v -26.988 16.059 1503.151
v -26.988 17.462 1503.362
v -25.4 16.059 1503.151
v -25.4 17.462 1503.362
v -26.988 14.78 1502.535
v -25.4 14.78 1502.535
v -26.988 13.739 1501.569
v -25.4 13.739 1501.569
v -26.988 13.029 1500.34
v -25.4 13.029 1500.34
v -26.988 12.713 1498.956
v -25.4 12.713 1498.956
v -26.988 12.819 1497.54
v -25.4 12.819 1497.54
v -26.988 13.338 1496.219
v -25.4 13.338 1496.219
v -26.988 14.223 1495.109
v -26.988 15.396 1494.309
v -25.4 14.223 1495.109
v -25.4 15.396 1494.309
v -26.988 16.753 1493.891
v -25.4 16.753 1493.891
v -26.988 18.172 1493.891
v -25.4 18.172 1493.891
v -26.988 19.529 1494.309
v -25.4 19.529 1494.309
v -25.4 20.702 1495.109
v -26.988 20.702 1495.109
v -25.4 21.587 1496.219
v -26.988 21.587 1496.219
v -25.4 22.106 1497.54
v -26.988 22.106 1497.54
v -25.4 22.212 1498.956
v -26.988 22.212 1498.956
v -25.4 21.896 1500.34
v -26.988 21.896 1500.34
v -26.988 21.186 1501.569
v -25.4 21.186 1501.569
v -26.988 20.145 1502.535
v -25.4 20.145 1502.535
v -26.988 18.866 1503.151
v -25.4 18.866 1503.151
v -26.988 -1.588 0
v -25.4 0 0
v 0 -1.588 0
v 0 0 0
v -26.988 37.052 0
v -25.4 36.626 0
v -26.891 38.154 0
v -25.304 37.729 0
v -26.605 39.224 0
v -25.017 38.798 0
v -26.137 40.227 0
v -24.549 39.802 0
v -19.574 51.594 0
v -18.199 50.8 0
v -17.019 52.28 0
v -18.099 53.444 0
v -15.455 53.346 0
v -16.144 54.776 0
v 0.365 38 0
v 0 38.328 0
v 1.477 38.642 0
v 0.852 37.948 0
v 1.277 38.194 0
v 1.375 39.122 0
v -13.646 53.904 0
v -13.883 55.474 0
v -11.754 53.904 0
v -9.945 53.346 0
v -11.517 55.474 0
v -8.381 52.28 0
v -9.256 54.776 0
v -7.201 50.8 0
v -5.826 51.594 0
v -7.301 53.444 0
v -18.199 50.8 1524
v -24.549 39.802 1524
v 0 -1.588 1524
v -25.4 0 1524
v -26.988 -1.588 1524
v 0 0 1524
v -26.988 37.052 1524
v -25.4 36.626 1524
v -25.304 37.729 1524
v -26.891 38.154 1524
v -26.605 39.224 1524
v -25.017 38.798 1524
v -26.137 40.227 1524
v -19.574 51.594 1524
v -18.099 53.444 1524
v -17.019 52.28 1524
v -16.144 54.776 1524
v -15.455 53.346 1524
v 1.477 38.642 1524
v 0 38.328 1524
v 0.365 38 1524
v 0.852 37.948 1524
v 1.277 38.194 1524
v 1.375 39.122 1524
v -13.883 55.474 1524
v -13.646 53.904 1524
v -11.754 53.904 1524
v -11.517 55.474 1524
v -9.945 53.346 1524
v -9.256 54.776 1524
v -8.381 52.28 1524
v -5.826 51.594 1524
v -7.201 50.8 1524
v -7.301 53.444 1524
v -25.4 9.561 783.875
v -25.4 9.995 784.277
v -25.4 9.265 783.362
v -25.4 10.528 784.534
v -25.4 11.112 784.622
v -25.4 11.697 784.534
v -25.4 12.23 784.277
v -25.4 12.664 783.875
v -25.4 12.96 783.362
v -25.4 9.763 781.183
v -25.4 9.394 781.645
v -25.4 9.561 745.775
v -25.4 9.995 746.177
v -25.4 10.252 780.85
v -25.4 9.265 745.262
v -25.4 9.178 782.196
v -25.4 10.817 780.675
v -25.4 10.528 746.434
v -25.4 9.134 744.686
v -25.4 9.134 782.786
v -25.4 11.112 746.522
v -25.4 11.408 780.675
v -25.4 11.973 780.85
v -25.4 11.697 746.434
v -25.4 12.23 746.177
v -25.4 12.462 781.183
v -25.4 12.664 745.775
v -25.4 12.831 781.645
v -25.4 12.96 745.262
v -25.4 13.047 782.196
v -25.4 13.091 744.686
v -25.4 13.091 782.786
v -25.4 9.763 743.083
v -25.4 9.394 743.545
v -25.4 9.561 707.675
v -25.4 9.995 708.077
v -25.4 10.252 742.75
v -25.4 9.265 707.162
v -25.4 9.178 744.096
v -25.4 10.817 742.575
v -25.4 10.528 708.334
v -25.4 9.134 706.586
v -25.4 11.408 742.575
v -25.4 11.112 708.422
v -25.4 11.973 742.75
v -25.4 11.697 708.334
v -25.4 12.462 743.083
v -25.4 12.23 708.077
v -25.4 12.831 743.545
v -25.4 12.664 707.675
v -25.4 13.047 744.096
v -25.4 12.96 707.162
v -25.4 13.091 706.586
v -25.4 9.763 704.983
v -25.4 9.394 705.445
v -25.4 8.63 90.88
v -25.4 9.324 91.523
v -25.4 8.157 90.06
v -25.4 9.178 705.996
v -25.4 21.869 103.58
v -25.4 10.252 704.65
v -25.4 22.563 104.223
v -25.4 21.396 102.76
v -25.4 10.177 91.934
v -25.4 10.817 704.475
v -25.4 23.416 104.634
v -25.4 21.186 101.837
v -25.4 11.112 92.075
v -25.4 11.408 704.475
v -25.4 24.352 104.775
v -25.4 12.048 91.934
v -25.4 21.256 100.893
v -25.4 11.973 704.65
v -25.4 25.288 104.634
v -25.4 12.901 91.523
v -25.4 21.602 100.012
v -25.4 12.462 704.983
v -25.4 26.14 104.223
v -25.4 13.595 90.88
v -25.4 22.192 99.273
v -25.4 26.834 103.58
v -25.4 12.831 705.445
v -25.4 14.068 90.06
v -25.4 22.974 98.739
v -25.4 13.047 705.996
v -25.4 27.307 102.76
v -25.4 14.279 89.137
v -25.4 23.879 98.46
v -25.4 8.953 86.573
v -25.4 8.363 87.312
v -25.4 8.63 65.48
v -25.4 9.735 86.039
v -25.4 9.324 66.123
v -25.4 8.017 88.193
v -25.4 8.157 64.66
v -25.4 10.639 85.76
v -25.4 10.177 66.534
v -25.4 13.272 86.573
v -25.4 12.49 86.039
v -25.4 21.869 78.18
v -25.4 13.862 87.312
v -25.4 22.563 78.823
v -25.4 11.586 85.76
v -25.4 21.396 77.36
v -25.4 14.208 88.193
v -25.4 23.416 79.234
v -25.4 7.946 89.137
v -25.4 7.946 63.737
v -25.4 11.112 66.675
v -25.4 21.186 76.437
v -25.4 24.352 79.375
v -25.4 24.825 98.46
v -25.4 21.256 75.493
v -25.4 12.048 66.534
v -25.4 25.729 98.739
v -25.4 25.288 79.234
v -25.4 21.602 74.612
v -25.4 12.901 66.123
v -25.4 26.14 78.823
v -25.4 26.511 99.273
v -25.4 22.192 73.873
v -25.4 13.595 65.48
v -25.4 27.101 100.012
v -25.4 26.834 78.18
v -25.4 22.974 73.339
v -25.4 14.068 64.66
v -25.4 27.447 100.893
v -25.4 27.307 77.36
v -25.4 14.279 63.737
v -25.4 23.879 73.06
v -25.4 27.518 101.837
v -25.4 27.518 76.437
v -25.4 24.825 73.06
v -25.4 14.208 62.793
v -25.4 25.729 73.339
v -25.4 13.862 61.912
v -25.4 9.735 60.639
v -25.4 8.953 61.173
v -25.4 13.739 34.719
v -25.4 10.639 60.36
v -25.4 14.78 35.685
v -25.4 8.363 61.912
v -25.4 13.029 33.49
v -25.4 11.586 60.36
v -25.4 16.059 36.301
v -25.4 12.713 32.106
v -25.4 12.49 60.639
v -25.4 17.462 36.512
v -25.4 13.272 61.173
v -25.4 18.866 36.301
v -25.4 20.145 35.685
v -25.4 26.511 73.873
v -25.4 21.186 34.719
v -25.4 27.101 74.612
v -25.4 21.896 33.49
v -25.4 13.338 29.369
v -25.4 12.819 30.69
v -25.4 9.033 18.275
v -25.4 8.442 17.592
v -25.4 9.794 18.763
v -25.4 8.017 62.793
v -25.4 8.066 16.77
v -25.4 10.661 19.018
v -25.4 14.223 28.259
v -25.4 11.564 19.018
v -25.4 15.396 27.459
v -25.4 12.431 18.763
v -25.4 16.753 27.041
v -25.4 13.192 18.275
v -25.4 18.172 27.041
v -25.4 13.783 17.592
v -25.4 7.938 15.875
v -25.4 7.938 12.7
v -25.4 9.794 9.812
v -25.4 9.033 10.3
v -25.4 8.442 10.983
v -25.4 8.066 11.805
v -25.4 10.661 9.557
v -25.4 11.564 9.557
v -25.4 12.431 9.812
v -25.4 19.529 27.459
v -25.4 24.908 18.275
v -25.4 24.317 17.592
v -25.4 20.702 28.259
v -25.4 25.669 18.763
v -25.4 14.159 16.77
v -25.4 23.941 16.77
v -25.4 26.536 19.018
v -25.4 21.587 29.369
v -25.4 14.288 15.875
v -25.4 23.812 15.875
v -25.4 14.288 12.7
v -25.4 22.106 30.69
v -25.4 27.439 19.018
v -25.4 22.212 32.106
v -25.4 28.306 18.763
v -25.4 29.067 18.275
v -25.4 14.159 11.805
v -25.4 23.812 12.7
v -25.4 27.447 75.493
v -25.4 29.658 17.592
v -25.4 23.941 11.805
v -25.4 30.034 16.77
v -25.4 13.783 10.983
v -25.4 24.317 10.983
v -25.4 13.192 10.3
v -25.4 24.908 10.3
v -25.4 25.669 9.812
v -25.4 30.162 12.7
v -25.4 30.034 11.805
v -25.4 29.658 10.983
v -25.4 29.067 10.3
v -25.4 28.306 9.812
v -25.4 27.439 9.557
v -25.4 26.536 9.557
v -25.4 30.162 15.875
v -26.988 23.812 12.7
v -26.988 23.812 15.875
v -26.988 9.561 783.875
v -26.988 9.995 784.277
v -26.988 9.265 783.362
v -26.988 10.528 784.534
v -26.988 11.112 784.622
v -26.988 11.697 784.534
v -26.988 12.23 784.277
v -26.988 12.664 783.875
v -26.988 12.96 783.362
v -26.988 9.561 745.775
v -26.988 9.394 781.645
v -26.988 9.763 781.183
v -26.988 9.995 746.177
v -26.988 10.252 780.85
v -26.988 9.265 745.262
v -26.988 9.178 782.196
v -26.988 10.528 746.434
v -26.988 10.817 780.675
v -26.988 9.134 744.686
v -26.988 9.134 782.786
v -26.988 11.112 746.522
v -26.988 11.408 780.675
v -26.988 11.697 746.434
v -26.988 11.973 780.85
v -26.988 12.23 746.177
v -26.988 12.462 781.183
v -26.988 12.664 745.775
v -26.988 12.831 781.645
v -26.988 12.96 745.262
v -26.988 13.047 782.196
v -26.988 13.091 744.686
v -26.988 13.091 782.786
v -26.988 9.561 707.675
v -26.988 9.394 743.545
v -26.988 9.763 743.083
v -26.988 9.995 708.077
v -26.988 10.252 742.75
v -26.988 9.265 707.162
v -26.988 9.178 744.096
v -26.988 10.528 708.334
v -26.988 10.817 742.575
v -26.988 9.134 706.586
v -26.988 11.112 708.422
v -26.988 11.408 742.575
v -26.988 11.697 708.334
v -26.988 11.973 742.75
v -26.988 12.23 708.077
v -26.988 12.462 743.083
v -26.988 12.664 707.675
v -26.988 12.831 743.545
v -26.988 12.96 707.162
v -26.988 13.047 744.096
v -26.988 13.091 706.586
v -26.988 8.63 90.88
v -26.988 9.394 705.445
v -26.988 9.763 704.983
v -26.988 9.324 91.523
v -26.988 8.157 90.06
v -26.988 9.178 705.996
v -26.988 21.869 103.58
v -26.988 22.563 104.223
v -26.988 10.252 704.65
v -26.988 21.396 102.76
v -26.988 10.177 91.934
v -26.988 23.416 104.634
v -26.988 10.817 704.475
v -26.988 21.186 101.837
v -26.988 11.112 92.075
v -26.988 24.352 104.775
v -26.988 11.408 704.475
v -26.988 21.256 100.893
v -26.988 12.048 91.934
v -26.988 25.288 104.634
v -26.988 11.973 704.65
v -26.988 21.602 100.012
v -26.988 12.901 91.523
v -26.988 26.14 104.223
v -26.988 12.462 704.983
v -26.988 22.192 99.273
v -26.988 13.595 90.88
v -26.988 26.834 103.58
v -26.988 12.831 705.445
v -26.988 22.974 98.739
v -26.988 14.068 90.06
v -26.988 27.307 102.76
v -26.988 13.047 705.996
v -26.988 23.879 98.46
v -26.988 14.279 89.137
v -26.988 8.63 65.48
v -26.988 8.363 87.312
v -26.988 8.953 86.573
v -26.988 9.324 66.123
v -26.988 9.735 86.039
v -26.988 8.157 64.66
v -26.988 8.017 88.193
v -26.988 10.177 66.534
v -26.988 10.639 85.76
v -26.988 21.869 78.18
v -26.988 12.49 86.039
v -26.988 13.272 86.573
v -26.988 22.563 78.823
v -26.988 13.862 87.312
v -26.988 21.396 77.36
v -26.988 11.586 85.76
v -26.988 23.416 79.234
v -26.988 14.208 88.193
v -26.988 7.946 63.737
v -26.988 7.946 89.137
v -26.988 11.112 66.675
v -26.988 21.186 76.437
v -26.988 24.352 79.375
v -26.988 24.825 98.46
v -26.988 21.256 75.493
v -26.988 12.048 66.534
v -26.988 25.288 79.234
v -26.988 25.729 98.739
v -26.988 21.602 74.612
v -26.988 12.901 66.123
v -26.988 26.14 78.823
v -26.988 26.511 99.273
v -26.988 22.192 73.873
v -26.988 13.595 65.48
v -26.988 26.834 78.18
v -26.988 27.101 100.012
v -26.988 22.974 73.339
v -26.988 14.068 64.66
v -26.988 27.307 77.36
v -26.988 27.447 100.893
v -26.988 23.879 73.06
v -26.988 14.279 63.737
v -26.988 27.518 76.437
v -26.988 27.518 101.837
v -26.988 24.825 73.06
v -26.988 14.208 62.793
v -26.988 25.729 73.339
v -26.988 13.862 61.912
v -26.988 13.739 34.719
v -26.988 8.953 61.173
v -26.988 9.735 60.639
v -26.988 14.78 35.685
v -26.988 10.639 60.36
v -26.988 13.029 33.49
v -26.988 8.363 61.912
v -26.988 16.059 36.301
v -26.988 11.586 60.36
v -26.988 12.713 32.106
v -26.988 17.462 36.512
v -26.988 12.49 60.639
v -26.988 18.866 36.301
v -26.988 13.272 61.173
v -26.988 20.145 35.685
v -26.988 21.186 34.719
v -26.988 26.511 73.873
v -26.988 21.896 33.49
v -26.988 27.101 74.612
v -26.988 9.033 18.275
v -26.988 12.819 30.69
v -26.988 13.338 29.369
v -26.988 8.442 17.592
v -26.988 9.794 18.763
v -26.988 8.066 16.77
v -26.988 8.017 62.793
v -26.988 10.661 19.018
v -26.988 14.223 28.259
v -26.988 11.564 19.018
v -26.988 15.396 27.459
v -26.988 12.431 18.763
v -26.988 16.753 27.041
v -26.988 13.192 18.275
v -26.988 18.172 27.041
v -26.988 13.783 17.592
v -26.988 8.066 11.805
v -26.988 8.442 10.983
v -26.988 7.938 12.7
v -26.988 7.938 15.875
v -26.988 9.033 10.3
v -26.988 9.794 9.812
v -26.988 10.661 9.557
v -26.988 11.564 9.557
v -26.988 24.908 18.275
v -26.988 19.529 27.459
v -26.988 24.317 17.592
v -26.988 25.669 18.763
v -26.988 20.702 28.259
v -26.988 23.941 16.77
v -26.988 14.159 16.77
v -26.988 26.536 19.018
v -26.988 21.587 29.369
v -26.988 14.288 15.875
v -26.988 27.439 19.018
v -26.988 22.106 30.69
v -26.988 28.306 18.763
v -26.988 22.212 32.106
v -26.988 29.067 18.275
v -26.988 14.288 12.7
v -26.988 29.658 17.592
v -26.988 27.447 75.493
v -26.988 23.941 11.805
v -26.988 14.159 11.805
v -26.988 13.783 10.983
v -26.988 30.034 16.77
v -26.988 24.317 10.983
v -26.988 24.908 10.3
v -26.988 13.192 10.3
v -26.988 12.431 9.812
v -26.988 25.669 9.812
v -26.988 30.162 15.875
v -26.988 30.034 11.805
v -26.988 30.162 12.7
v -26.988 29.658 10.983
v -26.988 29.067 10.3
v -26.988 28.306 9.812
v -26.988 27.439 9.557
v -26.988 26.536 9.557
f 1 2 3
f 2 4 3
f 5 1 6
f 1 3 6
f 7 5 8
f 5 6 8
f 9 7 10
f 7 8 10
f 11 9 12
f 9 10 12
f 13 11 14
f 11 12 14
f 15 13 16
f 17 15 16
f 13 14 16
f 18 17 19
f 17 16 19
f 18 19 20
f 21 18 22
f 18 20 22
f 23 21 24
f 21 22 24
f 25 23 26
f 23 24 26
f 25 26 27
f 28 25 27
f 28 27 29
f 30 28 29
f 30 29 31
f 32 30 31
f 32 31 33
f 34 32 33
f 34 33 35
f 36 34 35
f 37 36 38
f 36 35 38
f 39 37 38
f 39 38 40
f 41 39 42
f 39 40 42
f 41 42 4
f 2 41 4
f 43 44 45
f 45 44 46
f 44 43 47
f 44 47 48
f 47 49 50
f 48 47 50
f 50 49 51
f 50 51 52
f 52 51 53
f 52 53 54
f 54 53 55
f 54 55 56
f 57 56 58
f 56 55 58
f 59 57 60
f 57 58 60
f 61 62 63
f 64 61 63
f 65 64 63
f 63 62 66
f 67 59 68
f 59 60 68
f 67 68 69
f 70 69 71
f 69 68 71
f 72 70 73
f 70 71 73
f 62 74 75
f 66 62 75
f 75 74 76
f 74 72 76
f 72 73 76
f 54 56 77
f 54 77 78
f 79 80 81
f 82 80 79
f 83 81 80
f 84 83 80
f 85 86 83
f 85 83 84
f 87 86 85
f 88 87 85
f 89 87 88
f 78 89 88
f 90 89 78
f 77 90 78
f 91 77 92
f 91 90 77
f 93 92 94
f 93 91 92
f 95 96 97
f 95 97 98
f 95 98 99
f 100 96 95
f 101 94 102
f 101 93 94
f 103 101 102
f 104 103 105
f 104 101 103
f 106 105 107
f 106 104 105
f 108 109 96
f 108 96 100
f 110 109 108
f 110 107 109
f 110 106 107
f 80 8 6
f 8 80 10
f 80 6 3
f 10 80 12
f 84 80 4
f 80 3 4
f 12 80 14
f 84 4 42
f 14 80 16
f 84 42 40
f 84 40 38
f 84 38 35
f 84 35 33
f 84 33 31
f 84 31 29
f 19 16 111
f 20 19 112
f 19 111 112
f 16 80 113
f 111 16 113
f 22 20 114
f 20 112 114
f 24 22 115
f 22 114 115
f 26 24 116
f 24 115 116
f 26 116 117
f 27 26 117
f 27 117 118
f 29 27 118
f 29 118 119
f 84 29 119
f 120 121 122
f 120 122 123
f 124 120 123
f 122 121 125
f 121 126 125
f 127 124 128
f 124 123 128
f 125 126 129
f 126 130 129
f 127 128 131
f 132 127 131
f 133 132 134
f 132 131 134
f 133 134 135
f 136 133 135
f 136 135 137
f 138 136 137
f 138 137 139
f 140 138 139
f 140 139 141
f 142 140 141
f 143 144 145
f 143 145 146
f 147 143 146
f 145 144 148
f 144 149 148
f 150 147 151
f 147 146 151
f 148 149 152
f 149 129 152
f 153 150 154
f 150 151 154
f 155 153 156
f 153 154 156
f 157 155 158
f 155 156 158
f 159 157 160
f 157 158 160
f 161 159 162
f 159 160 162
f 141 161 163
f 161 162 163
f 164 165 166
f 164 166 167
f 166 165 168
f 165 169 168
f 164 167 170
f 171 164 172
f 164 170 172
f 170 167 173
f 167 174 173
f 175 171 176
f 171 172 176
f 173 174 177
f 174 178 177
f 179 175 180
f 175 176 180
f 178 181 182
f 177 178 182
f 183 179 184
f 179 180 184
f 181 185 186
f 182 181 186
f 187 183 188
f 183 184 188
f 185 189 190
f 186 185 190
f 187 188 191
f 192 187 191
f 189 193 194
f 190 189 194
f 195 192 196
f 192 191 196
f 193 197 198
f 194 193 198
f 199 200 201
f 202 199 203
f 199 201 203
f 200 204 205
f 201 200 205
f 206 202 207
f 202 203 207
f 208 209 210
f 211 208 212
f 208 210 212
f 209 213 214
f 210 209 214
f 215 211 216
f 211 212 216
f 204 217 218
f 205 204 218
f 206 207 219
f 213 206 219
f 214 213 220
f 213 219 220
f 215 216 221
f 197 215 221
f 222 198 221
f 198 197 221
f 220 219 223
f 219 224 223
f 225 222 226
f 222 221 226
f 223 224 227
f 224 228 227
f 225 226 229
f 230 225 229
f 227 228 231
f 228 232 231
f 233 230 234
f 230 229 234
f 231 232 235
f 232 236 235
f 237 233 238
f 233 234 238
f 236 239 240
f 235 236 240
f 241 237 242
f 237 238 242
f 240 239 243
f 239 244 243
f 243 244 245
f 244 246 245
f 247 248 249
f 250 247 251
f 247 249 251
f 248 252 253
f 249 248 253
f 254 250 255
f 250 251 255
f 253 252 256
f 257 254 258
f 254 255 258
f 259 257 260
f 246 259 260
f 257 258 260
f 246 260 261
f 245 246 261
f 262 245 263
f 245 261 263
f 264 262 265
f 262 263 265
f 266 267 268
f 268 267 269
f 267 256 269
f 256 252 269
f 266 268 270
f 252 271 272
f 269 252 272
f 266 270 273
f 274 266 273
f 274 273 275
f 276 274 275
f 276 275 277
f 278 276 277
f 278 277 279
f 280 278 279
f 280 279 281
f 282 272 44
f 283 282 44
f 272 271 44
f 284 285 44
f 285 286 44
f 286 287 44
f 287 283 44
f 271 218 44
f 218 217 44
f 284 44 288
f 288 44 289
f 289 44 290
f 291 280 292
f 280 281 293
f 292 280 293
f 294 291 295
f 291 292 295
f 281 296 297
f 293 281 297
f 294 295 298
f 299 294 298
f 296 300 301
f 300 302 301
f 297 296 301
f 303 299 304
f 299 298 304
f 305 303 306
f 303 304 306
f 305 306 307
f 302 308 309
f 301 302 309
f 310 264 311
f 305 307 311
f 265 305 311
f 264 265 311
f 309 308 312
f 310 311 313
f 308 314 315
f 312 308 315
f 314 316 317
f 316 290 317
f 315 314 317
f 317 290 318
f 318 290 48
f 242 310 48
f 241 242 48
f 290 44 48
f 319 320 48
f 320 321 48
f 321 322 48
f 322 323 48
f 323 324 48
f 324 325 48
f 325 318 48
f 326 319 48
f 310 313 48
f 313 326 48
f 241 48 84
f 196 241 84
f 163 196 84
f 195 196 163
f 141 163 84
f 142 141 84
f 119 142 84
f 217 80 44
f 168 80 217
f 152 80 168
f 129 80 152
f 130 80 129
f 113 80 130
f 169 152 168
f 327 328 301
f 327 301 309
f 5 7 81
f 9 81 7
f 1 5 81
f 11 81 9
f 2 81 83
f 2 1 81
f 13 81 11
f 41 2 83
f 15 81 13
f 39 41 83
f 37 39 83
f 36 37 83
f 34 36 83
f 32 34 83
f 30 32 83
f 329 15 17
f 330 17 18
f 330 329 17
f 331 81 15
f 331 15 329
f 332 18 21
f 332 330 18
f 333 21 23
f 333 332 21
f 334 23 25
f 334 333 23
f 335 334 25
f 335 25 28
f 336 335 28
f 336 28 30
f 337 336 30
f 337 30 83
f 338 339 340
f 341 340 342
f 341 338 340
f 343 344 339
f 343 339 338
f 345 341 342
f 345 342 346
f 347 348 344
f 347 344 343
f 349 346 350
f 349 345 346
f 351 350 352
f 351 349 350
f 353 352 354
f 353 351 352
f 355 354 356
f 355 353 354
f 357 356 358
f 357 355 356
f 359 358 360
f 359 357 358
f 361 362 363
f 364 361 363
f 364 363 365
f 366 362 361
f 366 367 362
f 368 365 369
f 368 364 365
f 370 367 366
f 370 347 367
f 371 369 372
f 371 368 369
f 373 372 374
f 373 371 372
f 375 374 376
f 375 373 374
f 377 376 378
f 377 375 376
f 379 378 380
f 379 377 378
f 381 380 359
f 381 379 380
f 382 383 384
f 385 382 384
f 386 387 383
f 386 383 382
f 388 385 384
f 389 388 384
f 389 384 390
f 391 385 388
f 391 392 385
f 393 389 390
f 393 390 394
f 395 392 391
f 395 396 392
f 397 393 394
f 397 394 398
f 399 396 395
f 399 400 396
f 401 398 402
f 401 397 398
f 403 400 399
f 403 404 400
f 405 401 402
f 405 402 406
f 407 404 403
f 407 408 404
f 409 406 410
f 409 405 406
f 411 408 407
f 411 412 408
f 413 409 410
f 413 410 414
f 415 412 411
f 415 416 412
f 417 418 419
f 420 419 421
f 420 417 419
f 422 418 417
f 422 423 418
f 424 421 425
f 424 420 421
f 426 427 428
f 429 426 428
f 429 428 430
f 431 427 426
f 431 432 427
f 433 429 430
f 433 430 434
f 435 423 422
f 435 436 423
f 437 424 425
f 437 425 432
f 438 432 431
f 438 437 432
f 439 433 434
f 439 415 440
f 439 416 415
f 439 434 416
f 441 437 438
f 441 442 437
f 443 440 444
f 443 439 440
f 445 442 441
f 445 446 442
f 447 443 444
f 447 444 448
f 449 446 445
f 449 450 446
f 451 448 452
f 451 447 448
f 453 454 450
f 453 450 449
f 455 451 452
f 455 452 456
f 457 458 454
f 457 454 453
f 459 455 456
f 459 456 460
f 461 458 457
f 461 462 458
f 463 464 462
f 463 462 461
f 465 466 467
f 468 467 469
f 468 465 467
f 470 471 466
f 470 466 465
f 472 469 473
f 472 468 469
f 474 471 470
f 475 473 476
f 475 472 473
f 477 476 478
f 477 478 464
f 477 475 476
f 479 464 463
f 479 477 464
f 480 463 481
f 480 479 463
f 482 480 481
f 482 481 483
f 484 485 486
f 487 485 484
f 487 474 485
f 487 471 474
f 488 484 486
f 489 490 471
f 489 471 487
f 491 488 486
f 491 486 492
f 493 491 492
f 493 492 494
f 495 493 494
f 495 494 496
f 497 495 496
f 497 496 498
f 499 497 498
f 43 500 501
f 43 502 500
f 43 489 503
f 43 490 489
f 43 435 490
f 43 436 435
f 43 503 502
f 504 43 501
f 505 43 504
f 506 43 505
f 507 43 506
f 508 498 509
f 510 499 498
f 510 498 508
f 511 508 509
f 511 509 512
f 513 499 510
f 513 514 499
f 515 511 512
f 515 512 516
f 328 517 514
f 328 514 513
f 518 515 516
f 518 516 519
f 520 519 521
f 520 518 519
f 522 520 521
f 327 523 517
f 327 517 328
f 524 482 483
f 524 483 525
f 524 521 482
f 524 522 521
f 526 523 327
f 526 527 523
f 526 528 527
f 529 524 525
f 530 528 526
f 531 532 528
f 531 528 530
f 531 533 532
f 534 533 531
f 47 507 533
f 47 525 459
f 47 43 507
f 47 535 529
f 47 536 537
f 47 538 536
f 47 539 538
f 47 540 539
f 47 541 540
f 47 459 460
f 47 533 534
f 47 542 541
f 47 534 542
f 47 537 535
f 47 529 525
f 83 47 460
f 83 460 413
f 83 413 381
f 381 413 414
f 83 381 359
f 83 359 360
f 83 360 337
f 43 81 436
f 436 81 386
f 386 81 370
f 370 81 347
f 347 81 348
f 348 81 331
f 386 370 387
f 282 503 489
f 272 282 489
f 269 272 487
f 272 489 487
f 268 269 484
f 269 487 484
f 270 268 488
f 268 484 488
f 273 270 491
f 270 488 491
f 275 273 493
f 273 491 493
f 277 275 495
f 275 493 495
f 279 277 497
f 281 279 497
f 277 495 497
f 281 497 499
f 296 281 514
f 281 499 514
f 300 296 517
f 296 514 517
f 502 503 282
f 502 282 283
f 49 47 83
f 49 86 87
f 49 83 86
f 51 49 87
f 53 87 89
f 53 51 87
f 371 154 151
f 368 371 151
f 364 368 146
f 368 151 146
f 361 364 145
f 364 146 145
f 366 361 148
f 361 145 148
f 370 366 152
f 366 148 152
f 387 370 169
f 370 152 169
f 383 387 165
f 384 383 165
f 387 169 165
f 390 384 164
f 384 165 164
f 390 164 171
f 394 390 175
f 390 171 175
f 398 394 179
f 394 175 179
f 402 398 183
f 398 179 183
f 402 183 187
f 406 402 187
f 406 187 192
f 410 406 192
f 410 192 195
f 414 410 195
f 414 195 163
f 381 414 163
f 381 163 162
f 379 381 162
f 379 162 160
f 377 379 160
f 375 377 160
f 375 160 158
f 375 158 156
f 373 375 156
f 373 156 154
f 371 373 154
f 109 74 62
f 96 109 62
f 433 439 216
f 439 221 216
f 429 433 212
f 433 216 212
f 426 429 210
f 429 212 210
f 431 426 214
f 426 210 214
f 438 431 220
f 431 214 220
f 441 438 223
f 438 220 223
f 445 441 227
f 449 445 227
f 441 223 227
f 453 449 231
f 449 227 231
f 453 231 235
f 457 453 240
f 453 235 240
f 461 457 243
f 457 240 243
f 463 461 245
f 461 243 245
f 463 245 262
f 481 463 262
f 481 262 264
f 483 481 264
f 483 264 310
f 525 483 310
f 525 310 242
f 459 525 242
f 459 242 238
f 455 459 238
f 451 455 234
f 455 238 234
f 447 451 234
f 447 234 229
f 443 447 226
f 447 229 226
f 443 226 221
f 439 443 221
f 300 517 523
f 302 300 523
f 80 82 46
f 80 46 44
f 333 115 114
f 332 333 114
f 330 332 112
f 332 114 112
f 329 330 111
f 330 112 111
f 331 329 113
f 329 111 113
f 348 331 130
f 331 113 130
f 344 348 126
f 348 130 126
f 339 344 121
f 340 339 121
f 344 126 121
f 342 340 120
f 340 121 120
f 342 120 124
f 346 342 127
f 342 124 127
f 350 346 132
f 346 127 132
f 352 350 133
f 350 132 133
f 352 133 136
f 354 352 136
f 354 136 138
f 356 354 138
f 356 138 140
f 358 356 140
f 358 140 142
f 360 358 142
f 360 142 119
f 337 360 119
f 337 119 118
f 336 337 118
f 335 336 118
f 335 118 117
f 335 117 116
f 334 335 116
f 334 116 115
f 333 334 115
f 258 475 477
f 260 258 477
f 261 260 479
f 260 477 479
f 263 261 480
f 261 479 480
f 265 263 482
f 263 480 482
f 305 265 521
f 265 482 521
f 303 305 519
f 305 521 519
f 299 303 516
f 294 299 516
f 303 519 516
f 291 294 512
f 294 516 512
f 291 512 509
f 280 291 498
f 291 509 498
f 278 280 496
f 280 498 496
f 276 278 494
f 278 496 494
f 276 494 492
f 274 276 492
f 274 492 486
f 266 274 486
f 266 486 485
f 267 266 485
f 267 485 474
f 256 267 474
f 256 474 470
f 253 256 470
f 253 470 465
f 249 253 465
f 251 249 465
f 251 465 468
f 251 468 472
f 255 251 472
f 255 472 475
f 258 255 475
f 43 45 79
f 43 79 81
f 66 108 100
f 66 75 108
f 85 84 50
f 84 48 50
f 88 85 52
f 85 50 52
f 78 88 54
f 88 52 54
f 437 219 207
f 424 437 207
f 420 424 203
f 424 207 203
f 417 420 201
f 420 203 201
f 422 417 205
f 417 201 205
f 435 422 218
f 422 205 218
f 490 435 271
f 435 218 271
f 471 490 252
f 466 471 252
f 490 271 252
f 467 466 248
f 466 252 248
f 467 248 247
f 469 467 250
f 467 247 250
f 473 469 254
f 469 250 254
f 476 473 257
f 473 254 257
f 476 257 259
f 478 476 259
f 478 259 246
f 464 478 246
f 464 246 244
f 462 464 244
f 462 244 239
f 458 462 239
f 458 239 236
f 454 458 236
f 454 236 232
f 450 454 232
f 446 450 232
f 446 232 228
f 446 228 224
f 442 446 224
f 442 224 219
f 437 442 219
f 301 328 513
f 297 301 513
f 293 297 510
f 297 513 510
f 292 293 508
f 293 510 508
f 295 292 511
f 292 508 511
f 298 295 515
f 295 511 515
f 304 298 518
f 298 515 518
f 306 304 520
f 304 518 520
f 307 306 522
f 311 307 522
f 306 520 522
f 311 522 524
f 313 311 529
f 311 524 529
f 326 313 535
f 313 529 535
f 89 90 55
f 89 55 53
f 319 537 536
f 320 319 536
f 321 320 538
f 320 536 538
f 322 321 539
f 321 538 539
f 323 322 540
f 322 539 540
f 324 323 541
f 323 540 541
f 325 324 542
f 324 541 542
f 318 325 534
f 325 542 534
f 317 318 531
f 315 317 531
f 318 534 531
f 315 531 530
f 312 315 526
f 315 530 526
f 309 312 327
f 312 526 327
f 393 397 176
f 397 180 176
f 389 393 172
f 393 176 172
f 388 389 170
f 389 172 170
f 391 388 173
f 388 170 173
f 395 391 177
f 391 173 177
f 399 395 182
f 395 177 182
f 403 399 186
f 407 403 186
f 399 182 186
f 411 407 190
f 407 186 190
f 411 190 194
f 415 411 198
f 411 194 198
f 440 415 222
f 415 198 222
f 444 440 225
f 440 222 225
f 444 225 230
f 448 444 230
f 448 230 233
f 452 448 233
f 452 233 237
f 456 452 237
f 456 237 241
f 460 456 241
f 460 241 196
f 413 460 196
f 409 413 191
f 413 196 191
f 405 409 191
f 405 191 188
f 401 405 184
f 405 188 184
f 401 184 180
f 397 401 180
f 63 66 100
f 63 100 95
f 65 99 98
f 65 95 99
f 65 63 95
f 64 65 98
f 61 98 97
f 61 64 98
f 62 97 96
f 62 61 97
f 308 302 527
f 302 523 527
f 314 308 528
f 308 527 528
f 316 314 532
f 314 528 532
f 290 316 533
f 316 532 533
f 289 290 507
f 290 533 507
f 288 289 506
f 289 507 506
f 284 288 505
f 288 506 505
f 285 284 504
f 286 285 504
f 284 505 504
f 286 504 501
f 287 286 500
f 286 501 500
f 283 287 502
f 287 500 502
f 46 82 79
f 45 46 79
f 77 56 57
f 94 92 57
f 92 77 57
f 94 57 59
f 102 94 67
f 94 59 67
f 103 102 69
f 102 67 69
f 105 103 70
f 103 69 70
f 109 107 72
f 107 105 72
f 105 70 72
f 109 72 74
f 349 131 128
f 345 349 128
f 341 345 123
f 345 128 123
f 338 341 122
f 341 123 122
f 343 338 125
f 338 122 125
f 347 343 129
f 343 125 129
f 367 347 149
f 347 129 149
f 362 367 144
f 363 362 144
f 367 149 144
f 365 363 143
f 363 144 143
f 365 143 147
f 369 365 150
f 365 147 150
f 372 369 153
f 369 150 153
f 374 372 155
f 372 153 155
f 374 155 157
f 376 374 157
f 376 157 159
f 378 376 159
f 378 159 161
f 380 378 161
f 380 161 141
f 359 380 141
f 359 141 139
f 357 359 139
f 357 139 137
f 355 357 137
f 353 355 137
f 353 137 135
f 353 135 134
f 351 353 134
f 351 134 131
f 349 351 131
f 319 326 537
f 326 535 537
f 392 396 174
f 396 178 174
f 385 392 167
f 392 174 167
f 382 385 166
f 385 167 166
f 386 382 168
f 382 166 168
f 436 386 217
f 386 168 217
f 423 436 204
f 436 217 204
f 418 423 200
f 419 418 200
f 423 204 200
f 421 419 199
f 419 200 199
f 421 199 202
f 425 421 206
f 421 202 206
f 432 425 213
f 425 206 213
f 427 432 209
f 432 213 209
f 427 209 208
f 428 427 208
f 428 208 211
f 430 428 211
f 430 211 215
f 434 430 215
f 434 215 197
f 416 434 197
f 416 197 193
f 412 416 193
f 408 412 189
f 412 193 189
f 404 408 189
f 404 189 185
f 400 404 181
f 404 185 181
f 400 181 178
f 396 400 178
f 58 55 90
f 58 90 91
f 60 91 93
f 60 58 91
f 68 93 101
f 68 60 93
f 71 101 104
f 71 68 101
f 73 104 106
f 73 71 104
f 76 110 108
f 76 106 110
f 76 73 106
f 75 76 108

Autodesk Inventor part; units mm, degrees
ref_plane "YZ Plane" through (0, 0, 0) normal (1, 0, 0) x (0, 1, 0)
ref_plane "XZ Plane" through (0, 0, 0) normal (0, 1, 0) x (-1, 0, 0)
ref_plane "XY Plane" through (0, 0, 0) normal (0, 0, 1) x (1, 0, 0)
sketch "Sketch1" plane through (0, 0, 0) normal (0, 0, 1) x (1, 0, 0)
  line L0 (0, 0) -> (-12.7, 0) construction
  line L1 (-12.7, 0) -> (-12.7, 53.975) construction
  line L2 (-12.7, 53.975) -> (0, 53.975) construction
  line L3 (0, 53.975) -> (0, 0) construction
  line L4 (-12.7, 53.975) -> (-25.4, 53.975) construction
  line L5 (-12.7, 53.975) -> (0, 53.975) construction
  line L6 (-25.4, 53.975) -> (-25.4, 0) construction
  line L7 (-25.4, 0) -> (-12.7, 0) construction
  circle A0 centre (-12.7, 6.35) radius 6.35 construction
  circle A1 centre (-12.7, 47.625) radius 6.35 construction
  line L8 (-12.7, 47.625) -> (-18.1993, 50.8) construction
  line L9 (-12.7, 47.625) -> (-6.35, 47.625) construction
  line L10 (-12.7, 47.625) -> (-7.2007, 50.8) construction
  line L11 (-12.7, 47.625) -> (-6.35, 47.625) construction
  line L12 (0, 0) -> (-25.4, 0)
  line L13 (0, 0) -> (0, -1.5875)
  line L14 (0, 0) -> (1.5875, 0) construction
  line L15 (0, -1.5875) -> (-26.9875, -1.5875)
  arc A2 (-7.2007, 50.8) -> (-18.1993, 50.8) centre (-12.7, 47.625) ccw
  line L16 (-7.2007, 50.8) -> (0, 38.328)
  line L17 (-7.2007, 50.8) -> (7.2007, 50.8) construction
  line L18 (-18.1993, 50.8) -> (-24.5493, 39.8015)
  line L19 (-18.1993, 50.8) -> (-5.4993, 50.8) construction
  line L20 (-25.4, 0) -> (-25.4, 36.6265)
  line L21 (-19.5741, 51.5937) -> (-26.1368, 40.2268)
  line L22 (-26.9875, -1.5875) -> (-26.9875, 37.0518)
  arc A3 (-26.1368, 40.2268) -> (-26.9875, 37.0518) centre (-20.6375, 37.0518) ccw
  arc A4 (-24.5493, 39.8015) -> (-25.4, 36.6265) centre (-19.05, 36.6265) ccw
  line L23 (-5.8259, 51.5937) -> (1.3748, 39.1217)
  arc A5 (-5.8259, 51.5937) -> (-19.5741, 51.5937) centre (-12.7, 47.625) ccw
  arc A6 (0, 38.328) -> (1.3748, 39.1217) centre (0.6874, 38.7248) ccw
  point P0 (-25.4, 38.328)
  dimension "d0" = 12.7
  dimension "d1" = 53.975
  dimension "d2" = 12.7
  dimension "d3" = 180
  dimension "d4" = 53.975
  dimension "d5" = 90
  dimension "d6" = 12.7
  dimension "d7" = 12.7
  dimension "d8" = 6.35
  dimension "d9" = 6.35
  dimension "d10" = 6.35
  dimension "d11" = 150
  dimension "d12" = 6.35
  dimension "d13" = 30
  dimension "d14" = 1.5875
  dimension "d15" = 90
  dimension "d16" = 26.9875
  dimension "d17" = 6.35
  dimension "d18" = 60
  dimension "d19" = 120
  dimension "d20" = 90
  dimension "d21" = 1.5875
  dimension "d22" = 6.35
  dimension "d23" = 6.35
  dimension "d24" = 1.5875
  dimension "d25" = 7.9375
  dimension "d26" = 0
extrude "Extrusion1" add sketch "Sketch1" along normal blind 1524
sketch "Sketch2" plane through (-26.9875, -1.5875, 0) normal (-1, 0, 0) x (0, 0, 1)
  line L0 (0, 38.6393) -> (0, 0) projected
  line L1 (0, 0) -> (1524, 0) projected
  line L2 (1524, 38.6393) -> (1524, 0) projected
  line L3 (0, 38.6393) -> (1524, 38.6393) projected
  point P0 (0, 1.5875)
  point P1 (1498.6, 19.05)
  dimension "d29" = 19.05
  dimension "d30" = 25.4
hole "Hole1" at (-26.9875, 17.4625, 1498.6) direction (1, 0, 0) diameter 9.525 end through all
sketch "Sketch3" plane through (-26.9875, -1.5875, 0) normal (-1, 0, 0) x (0, 0, 1)
  circle A0 centre (1498.6, 19.05) radius 4.7625 projected
  line L0 (0, 38.6393) -> (0, 0) projected
  line L1 (0, 0) -> (1524, 0) projected
  line L2 (1524, 38.6393) -> (1524, 0) projected
  line L3 (0, 38.6393) -> (1524, 38.6393) projected
  circle A1 centre (31.75, 19.05) radius 4.7625
  line L4 (15.875, 28.575) -> (15.875, 25.4) construction
  line L5 (15.875, 28.575) -> (15.875, 31.75) construction
  line L6 (12.7, 28.575) -> (12.7, 31.75) construction
  line L7 (12.7, 28.575) -> (12.7, 25.4) construction
  line L8 (15.875, 12.7) -> (15.875, 15.875) construction
  line L9 (12.7, 12.7) -> (12.7, 15.875) construction
  line L10 (15.875, 12.7) -> (15.875, 9.525) construction
  line L11 (12.7, 12.7) -> (12.7, 9.525) construction
  arc A2 (15.875, 25.4) -> (15.875, 31.75) centre (15.875, 28.575) ccw
  arc A3 (12.7, 31.75) -> (12.7, 25.4) centre (12.7, 28.575) ccw
  arc A4 (15.875, 9.525) -> (15.875, 15.875) centre (15.875, 12.7) ccw
  arc A5 (12.7, 15.875) -> (12.7, 9.525) centre (12.7, 12.7) ccw
  line L12 (15.875, 31.75) -> (12.7, 31.75)
  line L13 (15.875, 25.4) -> (12.7, 25.4)
  line L14 (15.875, 15.875) -> (12.7, 15.875)
  line L15 (15.875, 9.525) -> (12.7, 9.525)
  point P0 (0, 1.5875)
  dimension "d45" = 12.7
  dimension "d46" = 15.875
  dimension "d47" = 31.75
  dimension "d48" = 12.7
  dimension "d49" = 15.875
  dimension "d50" = 9.525
  dimension "d51" = 19.05
  dimension "d52" = 12.7
  dimension "d53" = 12.7
  dimension "d54" = 28.575
  dimension "d55" = 28.575
  dimension "d56" = 3.175
  dimension "d57" = 3.175
  dimension "d58" = 3.175
  dimension "d59" = 3.175
  dimension "d60" = 3.175
  dimension "d61" = 3.175
  dimension "d62" = 3.175
  dimension "d63" = 3.175
  dimension "d64" = 3.175
  dimension "d65" = 3.175
  dimension "d66" = 3.175
  dimension "d67" = 3.175
extrude "Extrusion2" cut sketch "Sketch3" against normal blind 25.4 contours A1 | L13 A3 L12 A2 | L15 A5 L14 A4
sketch "Sketch4" plane through (-26.9875, -1.5875, 0) normal (-1, 0, 0) x (0, 0, 1)
  line L0 (12.7, 15.875) -> (15.875, 15.875) projected
  arc A0 (15.875, 9.525) -> (15.875, 15.875) centre (15.875, 12.7) ccw projected
  line L1 (15.875, 9.525) -> (12.7, 9.525) projected
  arc A1 (12.7, 15.875) -> (12.7, 9.525) centre (12.7, 12.7) ccw projected
  line L2 (12.7, 31.75) -> (15.875, 31.75) projected
  arc A2 (15.875, 25.4) -> (15.875, 31.75) centre (15.875, 28.575) ccw projected
  line L3 (15.875, 25.4) -> (12.7, 25.4) projected
  arc A3 (12.7, 31.75) -> (12.7, 25.4) centre (12.7, 28.575) ccw projected
  circle A4 centre (31.75, 19.05) radius 4.7625 projected
  circle A5 centre (1498.6, 19.05) radius 4.7625 projected
  line L4 (0, 38.6393) -> (0, 0) projected
  line L5 (0, 0) -> (1524, 0) projected
  line L6 (1524, 38.6393) -> (1524, 0) projected
  line L7 (0, 38.6393) -> (1524, 38.6393) projected
  point P0 (0, 1.5875)
  point P1 (101.6, 25.9393)
  point P2 (88.9, 12.7)
  point P3 (76.2, 25.9393)
  point P4 (63.5, 12.7)
  dimension "d70" = 63.5
  dimension "d71" = 76.2
  dimension "d72" = 88.9
  dimension "d73" = 101.6
  dimension "d74" = 12.7
  dimension "d75" = 12.7
  dimension "d76" = 12.7
  dimension "d77" = 12.7
hole "Hole2" at (-26.9875, 24.3518, 101.6) at (-26.9875, 11.1125, 88.9) at (-26.9875, 24.3518, 76.2) at (-26.9875, 11.1125, 63.5) direction (1, 0, 0) diameter 6.35 end through all
sketch "Sketch5" plane through (-26.9875, -1.5875, 0) normal (-1, 0, 0) x (0, 0, 1)
  circle A0 centre (76.2, 25.9393) radius 3.175 projected
  circle A1 centre (101.6, 25.9393) radius 3.175 projected
  circle A2 centre (88.9, 12.7) radius 3.175 projected
  circle A3 centre (63.5, 12.7) radius 3.175 projected
  line L0 (12.7, 15.875) -> (15.875, 15.875) projected
  arc A4 (15.875, 9.525) -> (15.875, 15.875) centre (15.875, 12.7) ccw projected
  line L1 (15.875, 9.525) -> (12.7, 9.525) projected
  arc A5 (12.7, 15.875) -> (12.7, 9.525) centre (12.7, 12.7) ccw projected
  line L2 (12.7, 31.75) -> (15.875, 31.75) projected
  arc A6 (15.875, 25.4) -> (15.875, 31.75) centre (15.875, 28.575) ccw projected
  line L3 (15.875, 25.4) -> (12.7, 25.4) projected
  arc A7 (12.7, 31.75) -> (12.7, 25.4) centre (12.7, 28.575) ccw projected
  circle A8 centre (31.75, 19.05) radius 4.7625 projected
  circle A9 centre (1498.6, 19.05) radius 4.7625 projected
  line L4 (0, 38.6393) -> (0, 0) projected
  line L5 (0, 0) -> (1524, 0) projected
  line L6 (1524, 38.6393) -> (1524, 0) projected
  line L7 (0, 38.6393) -> (1524, 38.6393) projected
  point P0 (0, 1.5875)
  point P1 (706.4375, 12.7)
  point P2 (782.6375, 12.7)
  point P3 (744.5375, 12.7)
  dimension "d85" = 12.7
  dimension "d86" = 12.7
  dimension "d87" = 12.7
  dimension "d88" = 706.4375
  dimension "d89" = 744.5375
  dimension "d90" = 782.6375
hole "Hole3" at (-26.9875, 11.1125, 706.4375) at (-26.9875, 11.1125, 782.6375) at (-26.9875, 11.1125, 744.5375) direction (1, 0, 0) diameter 3.9688 end through all
properties part number "2in rail right"
